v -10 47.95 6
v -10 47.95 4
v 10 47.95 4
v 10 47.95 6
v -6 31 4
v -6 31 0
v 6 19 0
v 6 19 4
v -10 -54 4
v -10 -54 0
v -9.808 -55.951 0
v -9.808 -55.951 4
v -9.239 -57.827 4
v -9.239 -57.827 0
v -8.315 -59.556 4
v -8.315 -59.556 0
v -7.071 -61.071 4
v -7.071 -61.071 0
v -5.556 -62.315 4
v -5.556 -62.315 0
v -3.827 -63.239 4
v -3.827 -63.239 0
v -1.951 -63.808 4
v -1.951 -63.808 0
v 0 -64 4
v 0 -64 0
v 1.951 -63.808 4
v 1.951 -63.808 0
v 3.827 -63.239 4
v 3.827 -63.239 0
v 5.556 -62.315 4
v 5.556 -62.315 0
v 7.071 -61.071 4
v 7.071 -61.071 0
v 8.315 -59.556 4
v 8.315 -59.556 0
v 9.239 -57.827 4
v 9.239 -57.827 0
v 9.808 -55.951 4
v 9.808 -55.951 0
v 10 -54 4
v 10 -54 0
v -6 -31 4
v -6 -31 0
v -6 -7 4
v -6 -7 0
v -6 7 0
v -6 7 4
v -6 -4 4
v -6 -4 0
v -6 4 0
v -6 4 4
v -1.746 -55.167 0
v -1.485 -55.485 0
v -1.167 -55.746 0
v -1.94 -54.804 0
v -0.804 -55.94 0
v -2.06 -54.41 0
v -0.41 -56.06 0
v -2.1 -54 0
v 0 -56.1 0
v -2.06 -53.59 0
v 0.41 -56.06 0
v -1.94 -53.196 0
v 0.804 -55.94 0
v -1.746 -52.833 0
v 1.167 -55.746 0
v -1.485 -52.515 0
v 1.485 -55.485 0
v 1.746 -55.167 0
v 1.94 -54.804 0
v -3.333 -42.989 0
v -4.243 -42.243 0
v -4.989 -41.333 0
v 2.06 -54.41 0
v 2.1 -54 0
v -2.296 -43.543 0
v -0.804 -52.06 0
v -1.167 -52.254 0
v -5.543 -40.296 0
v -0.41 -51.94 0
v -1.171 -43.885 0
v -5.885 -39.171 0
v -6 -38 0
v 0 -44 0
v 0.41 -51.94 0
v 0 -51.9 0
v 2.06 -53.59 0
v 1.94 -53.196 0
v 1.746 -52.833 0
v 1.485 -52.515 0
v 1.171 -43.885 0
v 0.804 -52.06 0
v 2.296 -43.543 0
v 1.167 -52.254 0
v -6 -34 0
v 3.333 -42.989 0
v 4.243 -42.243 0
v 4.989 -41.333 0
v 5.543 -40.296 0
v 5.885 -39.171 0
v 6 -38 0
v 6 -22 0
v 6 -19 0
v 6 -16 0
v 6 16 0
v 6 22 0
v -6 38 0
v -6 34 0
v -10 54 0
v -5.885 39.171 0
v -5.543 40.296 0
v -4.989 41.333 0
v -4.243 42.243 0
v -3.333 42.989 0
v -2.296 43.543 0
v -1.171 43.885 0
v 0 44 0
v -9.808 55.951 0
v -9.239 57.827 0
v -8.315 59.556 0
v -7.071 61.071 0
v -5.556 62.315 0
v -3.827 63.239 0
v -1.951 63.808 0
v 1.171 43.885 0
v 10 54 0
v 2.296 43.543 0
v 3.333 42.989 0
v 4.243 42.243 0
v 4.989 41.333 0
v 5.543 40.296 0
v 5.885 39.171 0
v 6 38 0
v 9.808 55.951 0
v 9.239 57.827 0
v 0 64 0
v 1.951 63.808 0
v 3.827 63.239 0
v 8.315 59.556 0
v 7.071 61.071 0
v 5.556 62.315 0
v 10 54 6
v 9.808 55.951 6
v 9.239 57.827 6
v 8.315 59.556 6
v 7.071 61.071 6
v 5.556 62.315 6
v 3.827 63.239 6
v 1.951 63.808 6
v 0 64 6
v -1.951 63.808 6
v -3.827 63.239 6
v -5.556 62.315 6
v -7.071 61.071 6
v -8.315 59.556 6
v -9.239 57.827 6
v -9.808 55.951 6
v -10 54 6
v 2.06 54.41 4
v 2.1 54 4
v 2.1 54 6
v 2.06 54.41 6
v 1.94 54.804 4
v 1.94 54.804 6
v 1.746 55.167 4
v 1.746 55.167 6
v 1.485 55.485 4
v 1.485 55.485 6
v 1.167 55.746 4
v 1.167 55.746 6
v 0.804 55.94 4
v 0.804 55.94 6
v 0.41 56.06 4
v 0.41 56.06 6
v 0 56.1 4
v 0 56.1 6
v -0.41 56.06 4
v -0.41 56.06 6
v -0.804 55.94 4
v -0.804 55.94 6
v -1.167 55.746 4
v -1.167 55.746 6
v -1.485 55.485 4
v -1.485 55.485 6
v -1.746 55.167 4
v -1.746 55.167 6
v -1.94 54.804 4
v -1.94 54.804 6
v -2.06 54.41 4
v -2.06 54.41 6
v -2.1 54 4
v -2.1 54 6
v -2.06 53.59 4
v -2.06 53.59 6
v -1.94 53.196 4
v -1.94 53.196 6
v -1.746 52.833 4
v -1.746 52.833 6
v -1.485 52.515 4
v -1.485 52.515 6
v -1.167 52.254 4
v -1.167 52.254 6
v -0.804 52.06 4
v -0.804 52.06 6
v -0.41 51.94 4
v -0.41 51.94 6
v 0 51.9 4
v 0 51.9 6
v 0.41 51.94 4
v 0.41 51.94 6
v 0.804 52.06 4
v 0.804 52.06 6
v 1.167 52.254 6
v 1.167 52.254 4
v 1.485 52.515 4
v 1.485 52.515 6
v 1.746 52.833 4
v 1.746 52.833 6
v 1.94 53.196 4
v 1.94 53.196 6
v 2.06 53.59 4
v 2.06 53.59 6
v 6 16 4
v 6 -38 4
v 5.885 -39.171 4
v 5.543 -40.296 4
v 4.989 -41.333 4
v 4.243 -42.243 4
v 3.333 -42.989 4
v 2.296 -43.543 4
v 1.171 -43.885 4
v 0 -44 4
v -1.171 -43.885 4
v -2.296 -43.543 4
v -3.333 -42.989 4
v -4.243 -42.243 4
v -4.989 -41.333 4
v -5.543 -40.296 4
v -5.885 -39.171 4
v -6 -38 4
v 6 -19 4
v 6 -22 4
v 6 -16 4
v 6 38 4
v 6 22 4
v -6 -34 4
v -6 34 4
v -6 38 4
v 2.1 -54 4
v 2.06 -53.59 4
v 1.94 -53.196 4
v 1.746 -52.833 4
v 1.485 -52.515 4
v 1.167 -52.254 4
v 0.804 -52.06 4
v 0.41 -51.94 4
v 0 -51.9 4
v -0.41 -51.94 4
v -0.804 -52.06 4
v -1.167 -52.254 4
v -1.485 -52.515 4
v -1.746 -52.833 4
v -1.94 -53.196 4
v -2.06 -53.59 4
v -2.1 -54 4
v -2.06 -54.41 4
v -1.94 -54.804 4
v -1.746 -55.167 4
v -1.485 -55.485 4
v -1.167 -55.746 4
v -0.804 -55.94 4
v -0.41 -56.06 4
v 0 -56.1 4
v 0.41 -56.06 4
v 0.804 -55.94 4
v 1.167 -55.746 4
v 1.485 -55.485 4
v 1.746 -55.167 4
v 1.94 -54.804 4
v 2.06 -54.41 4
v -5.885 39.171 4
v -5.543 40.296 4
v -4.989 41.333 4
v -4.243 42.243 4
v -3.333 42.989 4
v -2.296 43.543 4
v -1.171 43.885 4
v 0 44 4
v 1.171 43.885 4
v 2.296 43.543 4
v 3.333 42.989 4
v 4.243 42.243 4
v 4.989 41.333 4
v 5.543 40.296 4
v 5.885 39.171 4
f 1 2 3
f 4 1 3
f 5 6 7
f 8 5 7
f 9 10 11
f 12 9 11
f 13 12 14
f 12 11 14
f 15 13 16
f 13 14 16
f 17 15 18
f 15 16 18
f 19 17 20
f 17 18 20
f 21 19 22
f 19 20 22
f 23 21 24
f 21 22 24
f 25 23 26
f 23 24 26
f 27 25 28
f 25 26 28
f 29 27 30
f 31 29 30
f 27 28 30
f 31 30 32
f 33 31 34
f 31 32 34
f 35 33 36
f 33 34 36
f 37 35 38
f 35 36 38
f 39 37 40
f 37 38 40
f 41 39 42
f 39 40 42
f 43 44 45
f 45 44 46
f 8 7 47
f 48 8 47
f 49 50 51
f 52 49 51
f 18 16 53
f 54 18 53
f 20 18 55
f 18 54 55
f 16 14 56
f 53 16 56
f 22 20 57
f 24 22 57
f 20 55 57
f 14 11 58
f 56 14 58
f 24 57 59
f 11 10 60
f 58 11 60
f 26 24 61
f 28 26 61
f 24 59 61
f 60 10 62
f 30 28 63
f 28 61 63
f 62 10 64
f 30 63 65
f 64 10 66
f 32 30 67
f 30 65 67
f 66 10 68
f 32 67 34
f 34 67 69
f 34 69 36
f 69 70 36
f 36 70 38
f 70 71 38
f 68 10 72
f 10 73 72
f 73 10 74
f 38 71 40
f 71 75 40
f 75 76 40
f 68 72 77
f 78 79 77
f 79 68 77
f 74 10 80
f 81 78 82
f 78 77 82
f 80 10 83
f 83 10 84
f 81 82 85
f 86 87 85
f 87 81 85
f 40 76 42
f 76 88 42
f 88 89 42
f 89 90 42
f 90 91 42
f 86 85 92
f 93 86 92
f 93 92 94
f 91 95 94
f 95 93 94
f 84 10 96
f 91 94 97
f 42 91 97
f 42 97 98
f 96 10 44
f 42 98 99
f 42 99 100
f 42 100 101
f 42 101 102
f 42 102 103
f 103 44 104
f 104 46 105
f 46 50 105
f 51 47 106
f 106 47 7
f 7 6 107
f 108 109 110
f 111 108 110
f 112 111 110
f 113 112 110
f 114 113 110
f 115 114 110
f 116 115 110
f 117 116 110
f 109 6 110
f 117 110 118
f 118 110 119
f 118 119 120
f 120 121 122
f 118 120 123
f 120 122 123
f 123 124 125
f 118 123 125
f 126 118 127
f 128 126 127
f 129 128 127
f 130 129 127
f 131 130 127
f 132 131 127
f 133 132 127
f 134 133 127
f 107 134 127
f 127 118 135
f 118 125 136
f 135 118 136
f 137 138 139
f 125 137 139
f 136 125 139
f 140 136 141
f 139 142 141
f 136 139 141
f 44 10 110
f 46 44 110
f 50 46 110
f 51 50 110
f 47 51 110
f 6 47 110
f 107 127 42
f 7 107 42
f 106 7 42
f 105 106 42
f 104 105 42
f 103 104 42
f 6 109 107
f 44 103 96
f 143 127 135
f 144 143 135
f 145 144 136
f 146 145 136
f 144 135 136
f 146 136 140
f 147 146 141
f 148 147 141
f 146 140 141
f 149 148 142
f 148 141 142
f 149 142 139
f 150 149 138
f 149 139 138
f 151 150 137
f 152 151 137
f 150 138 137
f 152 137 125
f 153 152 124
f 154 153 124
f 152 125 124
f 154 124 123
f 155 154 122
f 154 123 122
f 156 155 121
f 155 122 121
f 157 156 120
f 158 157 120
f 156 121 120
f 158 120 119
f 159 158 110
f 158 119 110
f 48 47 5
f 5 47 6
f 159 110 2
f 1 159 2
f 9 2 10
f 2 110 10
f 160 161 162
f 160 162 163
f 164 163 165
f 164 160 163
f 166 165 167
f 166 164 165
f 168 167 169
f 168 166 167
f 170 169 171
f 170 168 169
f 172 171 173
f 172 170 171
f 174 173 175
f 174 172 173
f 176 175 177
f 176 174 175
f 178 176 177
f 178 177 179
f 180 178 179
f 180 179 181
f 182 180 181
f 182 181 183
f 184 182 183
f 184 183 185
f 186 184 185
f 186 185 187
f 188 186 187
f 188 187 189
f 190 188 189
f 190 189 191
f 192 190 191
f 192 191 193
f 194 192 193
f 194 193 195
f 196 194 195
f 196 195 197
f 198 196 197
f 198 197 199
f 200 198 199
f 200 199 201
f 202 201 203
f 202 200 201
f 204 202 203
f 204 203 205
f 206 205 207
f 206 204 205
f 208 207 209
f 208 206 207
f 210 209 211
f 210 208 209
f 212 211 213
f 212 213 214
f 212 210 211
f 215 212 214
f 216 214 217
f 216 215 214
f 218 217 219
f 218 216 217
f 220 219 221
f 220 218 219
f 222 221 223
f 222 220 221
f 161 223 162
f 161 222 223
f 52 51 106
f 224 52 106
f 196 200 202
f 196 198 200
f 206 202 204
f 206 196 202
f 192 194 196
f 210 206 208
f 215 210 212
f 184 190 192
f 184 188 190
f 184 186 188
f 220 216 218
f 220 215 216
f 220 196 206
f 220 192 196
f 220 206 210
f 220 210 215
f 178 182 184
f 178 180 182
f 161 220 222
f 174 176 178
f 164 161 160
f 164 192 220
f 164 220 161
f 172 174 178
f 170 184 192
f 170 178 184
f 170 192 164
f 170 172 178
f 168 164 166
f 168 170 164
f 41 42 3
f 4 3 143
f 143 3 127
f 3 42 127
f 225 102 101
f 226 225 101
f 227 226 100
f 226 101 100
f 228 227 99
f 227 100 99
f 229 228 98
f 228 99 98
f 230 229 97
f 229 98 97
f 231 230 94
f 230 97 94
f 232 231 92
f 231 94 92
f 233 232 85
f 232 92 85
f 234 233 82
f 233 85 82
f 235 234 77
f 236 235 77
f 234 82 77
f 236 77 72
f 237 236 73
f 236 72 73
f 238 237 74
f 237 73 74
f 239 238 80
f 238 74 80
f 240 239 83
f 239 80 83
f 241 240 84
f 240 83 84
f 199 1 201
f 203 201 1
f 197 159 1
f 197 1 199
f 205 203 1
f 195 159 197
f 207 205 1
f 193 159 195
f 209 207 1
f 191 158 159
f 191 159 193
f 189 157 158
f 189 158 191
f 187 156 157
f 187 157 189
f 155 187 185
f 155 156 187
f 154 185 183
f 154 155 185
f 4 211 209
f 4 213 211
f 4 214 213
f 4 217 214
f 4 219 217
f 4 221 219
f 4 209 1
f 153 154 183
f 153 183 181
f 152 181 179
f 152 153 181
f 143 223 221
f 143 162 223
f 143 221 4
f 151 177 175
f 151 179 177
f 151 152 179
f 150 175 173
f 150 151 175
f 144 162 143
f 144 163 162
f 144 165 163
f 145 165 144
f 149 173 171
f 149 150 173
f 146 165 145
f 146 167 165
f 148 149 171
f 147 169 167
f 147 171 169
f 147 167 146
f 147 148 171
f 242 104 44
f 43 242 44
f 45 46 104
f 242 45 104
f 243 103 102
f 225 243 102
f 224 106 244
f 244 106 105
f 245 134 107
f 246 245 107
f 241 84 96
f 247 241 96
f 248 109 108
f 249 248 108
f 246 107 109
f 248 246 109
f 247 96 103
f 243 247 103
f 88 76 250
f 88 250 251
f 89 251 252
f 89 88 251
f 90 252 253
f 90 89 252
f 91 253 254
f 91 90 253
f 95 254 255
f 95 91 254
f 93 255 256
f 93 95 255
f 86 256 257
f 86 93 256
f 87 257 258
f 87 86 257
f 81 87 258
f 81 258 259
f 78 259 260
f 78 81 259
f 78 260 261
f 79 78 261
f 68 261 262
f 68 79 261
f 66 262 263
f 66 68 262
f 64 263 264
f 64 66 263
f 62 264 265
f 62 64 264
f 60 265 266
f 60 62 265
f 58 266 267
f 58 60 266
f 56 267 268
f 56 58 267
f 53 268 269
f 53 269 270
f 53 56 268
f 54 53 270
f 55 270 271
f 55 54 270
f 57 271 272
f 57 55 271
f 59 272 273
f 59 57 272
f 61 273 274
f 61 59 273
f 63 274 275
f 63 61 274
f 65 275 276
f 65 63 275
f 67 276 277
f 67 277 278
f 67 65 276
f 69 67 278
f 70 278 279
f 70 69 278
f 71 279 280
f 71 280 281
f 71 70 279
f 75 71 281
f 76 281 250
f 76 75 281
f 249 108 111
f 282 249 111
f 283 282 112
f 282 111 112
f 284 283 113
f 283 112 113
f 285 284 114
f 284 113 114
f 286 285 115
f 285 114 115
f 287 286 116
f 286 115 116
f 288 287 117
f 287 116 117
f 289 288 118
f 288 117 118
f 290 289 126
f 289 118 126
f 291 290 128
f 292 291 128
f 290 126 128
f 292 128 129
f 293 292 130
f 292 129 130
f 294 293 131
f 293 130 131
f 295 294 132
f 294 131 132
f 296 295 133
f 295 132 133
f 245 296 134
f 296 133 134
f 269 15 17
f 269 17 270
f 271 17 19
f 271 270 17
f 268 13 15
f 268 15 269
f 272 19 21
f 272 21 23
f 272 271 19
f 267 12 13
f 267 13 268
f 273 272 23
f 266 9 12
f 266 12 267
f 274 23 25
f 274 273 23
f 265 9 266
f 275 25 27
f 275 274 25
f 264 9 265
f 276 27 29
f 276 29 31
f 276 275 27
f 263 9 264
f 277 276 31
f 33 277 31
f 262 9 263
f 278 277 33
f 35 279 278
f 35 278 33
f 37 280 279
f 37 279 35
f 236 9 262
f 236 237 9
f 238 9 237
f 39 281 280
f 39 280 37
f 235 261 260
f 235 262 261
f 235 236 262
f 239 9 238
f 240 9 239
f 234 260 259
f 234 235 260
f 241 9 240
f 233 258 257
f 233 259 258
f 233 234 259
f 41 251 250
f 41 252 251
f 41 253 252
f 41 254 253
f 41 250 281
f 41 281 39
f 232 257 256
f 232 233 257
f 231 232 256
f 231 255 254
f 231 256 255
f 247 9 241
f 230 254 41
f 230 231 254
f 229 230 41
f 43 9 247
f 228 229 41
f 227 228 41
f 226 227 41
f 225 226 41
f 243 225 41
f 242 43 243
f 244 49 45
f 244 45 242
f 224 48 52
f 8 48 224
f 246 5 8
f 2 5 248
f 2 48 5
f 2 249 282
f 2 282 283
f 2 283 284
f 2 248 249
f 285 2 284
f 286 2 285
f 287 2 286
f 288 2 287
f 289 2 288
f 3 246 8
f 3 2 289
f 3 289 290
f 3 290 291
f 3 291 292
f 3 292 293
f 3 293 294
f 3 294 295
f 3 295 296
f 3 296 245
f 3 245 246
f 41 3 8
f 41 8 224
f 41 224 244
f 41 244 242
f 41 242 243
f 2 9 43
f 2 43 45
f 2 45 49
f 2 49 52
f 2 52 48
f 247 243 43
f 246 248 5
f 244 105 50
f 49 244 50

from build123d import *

# Parameters (mm, degrees)
CROQUIS1_R              = 2.1
SALIENTE_EXTRUIR1_DEPTH = 4
CROQUIS1_6_R            = 2.1
SALIENTE_EXTRUIR3_DEPTH = 6


with BuildPart() as part:
    # Croquis1 → Saliente-Extruir1 (new body)
    with BuildSketch(Plane.XY):
        with BuildLine():
            ThreePointArc((10, 54), (0, 64), (-10, 54))
            Line((-10, 54), (-10, -54))
            ThreePointArc((-10, -54), (0, -64), (10, -54))
            Line((10, -54), (10, 54))
        make_face()
        with BuildLine():
            Line((6, 38), (6, 22))
            Line((6, 22), (-6, 34))
            Line((-6, 34), (-6, 38))
            ThreePointArc((-6, 38), (0, 44), (6, 38))
        make_face(mode=Mode.SUBTRACT)
        Polygon((-6, 7), (-6, 31), (6, 19), align=None, mode=Mode.SUBTRACT)
        Polygon((-6, -4), (-6, 4), (6, 16), (6, -16), align=None, mode=Mode.SUBTRACT)
        Polygon((-6, -31), (-6, -7), (6, -19), align=None, mode=Mode.SUBTRACT)
        with BuildLine():
            Line((-6, -38), (-6, -34))
            Line((-6, -34), (6, -22))
            Line((6, -22), (6, -38))
            ThreePointArc((6, -38), (0, -44), (-6, -38))
        make_face(mode=Mode.SUBTRACT)
        with Locations((0, -54)):
            Circle(CROQUIS1_R, mode=Mode.SUBTRACT)
    extrude(amount=SALIENTE_EXTRUIR1_DEPTH)

    # Croquis1<6> → Saliente-Extruir3 (add)
    with BuildSketch(Plane.XY):
        with BuildLine():
            Line((10, 47.95), (10, 54))
            ThreePointArc((10, 54), (0, 64), (-10, 54))
            Line((-10, 54), (-10, 47.95))
            Line((-10, 47.95), (10, 47.95))
        make_face()
        with Locations((0, 54)):
            Circle(CROQUIS1_6_R, mode=Mode.SUBTRACT)
    extrude(amount=SALIENTE_EXTRUIR3_DEPTH)


solid = part.part
